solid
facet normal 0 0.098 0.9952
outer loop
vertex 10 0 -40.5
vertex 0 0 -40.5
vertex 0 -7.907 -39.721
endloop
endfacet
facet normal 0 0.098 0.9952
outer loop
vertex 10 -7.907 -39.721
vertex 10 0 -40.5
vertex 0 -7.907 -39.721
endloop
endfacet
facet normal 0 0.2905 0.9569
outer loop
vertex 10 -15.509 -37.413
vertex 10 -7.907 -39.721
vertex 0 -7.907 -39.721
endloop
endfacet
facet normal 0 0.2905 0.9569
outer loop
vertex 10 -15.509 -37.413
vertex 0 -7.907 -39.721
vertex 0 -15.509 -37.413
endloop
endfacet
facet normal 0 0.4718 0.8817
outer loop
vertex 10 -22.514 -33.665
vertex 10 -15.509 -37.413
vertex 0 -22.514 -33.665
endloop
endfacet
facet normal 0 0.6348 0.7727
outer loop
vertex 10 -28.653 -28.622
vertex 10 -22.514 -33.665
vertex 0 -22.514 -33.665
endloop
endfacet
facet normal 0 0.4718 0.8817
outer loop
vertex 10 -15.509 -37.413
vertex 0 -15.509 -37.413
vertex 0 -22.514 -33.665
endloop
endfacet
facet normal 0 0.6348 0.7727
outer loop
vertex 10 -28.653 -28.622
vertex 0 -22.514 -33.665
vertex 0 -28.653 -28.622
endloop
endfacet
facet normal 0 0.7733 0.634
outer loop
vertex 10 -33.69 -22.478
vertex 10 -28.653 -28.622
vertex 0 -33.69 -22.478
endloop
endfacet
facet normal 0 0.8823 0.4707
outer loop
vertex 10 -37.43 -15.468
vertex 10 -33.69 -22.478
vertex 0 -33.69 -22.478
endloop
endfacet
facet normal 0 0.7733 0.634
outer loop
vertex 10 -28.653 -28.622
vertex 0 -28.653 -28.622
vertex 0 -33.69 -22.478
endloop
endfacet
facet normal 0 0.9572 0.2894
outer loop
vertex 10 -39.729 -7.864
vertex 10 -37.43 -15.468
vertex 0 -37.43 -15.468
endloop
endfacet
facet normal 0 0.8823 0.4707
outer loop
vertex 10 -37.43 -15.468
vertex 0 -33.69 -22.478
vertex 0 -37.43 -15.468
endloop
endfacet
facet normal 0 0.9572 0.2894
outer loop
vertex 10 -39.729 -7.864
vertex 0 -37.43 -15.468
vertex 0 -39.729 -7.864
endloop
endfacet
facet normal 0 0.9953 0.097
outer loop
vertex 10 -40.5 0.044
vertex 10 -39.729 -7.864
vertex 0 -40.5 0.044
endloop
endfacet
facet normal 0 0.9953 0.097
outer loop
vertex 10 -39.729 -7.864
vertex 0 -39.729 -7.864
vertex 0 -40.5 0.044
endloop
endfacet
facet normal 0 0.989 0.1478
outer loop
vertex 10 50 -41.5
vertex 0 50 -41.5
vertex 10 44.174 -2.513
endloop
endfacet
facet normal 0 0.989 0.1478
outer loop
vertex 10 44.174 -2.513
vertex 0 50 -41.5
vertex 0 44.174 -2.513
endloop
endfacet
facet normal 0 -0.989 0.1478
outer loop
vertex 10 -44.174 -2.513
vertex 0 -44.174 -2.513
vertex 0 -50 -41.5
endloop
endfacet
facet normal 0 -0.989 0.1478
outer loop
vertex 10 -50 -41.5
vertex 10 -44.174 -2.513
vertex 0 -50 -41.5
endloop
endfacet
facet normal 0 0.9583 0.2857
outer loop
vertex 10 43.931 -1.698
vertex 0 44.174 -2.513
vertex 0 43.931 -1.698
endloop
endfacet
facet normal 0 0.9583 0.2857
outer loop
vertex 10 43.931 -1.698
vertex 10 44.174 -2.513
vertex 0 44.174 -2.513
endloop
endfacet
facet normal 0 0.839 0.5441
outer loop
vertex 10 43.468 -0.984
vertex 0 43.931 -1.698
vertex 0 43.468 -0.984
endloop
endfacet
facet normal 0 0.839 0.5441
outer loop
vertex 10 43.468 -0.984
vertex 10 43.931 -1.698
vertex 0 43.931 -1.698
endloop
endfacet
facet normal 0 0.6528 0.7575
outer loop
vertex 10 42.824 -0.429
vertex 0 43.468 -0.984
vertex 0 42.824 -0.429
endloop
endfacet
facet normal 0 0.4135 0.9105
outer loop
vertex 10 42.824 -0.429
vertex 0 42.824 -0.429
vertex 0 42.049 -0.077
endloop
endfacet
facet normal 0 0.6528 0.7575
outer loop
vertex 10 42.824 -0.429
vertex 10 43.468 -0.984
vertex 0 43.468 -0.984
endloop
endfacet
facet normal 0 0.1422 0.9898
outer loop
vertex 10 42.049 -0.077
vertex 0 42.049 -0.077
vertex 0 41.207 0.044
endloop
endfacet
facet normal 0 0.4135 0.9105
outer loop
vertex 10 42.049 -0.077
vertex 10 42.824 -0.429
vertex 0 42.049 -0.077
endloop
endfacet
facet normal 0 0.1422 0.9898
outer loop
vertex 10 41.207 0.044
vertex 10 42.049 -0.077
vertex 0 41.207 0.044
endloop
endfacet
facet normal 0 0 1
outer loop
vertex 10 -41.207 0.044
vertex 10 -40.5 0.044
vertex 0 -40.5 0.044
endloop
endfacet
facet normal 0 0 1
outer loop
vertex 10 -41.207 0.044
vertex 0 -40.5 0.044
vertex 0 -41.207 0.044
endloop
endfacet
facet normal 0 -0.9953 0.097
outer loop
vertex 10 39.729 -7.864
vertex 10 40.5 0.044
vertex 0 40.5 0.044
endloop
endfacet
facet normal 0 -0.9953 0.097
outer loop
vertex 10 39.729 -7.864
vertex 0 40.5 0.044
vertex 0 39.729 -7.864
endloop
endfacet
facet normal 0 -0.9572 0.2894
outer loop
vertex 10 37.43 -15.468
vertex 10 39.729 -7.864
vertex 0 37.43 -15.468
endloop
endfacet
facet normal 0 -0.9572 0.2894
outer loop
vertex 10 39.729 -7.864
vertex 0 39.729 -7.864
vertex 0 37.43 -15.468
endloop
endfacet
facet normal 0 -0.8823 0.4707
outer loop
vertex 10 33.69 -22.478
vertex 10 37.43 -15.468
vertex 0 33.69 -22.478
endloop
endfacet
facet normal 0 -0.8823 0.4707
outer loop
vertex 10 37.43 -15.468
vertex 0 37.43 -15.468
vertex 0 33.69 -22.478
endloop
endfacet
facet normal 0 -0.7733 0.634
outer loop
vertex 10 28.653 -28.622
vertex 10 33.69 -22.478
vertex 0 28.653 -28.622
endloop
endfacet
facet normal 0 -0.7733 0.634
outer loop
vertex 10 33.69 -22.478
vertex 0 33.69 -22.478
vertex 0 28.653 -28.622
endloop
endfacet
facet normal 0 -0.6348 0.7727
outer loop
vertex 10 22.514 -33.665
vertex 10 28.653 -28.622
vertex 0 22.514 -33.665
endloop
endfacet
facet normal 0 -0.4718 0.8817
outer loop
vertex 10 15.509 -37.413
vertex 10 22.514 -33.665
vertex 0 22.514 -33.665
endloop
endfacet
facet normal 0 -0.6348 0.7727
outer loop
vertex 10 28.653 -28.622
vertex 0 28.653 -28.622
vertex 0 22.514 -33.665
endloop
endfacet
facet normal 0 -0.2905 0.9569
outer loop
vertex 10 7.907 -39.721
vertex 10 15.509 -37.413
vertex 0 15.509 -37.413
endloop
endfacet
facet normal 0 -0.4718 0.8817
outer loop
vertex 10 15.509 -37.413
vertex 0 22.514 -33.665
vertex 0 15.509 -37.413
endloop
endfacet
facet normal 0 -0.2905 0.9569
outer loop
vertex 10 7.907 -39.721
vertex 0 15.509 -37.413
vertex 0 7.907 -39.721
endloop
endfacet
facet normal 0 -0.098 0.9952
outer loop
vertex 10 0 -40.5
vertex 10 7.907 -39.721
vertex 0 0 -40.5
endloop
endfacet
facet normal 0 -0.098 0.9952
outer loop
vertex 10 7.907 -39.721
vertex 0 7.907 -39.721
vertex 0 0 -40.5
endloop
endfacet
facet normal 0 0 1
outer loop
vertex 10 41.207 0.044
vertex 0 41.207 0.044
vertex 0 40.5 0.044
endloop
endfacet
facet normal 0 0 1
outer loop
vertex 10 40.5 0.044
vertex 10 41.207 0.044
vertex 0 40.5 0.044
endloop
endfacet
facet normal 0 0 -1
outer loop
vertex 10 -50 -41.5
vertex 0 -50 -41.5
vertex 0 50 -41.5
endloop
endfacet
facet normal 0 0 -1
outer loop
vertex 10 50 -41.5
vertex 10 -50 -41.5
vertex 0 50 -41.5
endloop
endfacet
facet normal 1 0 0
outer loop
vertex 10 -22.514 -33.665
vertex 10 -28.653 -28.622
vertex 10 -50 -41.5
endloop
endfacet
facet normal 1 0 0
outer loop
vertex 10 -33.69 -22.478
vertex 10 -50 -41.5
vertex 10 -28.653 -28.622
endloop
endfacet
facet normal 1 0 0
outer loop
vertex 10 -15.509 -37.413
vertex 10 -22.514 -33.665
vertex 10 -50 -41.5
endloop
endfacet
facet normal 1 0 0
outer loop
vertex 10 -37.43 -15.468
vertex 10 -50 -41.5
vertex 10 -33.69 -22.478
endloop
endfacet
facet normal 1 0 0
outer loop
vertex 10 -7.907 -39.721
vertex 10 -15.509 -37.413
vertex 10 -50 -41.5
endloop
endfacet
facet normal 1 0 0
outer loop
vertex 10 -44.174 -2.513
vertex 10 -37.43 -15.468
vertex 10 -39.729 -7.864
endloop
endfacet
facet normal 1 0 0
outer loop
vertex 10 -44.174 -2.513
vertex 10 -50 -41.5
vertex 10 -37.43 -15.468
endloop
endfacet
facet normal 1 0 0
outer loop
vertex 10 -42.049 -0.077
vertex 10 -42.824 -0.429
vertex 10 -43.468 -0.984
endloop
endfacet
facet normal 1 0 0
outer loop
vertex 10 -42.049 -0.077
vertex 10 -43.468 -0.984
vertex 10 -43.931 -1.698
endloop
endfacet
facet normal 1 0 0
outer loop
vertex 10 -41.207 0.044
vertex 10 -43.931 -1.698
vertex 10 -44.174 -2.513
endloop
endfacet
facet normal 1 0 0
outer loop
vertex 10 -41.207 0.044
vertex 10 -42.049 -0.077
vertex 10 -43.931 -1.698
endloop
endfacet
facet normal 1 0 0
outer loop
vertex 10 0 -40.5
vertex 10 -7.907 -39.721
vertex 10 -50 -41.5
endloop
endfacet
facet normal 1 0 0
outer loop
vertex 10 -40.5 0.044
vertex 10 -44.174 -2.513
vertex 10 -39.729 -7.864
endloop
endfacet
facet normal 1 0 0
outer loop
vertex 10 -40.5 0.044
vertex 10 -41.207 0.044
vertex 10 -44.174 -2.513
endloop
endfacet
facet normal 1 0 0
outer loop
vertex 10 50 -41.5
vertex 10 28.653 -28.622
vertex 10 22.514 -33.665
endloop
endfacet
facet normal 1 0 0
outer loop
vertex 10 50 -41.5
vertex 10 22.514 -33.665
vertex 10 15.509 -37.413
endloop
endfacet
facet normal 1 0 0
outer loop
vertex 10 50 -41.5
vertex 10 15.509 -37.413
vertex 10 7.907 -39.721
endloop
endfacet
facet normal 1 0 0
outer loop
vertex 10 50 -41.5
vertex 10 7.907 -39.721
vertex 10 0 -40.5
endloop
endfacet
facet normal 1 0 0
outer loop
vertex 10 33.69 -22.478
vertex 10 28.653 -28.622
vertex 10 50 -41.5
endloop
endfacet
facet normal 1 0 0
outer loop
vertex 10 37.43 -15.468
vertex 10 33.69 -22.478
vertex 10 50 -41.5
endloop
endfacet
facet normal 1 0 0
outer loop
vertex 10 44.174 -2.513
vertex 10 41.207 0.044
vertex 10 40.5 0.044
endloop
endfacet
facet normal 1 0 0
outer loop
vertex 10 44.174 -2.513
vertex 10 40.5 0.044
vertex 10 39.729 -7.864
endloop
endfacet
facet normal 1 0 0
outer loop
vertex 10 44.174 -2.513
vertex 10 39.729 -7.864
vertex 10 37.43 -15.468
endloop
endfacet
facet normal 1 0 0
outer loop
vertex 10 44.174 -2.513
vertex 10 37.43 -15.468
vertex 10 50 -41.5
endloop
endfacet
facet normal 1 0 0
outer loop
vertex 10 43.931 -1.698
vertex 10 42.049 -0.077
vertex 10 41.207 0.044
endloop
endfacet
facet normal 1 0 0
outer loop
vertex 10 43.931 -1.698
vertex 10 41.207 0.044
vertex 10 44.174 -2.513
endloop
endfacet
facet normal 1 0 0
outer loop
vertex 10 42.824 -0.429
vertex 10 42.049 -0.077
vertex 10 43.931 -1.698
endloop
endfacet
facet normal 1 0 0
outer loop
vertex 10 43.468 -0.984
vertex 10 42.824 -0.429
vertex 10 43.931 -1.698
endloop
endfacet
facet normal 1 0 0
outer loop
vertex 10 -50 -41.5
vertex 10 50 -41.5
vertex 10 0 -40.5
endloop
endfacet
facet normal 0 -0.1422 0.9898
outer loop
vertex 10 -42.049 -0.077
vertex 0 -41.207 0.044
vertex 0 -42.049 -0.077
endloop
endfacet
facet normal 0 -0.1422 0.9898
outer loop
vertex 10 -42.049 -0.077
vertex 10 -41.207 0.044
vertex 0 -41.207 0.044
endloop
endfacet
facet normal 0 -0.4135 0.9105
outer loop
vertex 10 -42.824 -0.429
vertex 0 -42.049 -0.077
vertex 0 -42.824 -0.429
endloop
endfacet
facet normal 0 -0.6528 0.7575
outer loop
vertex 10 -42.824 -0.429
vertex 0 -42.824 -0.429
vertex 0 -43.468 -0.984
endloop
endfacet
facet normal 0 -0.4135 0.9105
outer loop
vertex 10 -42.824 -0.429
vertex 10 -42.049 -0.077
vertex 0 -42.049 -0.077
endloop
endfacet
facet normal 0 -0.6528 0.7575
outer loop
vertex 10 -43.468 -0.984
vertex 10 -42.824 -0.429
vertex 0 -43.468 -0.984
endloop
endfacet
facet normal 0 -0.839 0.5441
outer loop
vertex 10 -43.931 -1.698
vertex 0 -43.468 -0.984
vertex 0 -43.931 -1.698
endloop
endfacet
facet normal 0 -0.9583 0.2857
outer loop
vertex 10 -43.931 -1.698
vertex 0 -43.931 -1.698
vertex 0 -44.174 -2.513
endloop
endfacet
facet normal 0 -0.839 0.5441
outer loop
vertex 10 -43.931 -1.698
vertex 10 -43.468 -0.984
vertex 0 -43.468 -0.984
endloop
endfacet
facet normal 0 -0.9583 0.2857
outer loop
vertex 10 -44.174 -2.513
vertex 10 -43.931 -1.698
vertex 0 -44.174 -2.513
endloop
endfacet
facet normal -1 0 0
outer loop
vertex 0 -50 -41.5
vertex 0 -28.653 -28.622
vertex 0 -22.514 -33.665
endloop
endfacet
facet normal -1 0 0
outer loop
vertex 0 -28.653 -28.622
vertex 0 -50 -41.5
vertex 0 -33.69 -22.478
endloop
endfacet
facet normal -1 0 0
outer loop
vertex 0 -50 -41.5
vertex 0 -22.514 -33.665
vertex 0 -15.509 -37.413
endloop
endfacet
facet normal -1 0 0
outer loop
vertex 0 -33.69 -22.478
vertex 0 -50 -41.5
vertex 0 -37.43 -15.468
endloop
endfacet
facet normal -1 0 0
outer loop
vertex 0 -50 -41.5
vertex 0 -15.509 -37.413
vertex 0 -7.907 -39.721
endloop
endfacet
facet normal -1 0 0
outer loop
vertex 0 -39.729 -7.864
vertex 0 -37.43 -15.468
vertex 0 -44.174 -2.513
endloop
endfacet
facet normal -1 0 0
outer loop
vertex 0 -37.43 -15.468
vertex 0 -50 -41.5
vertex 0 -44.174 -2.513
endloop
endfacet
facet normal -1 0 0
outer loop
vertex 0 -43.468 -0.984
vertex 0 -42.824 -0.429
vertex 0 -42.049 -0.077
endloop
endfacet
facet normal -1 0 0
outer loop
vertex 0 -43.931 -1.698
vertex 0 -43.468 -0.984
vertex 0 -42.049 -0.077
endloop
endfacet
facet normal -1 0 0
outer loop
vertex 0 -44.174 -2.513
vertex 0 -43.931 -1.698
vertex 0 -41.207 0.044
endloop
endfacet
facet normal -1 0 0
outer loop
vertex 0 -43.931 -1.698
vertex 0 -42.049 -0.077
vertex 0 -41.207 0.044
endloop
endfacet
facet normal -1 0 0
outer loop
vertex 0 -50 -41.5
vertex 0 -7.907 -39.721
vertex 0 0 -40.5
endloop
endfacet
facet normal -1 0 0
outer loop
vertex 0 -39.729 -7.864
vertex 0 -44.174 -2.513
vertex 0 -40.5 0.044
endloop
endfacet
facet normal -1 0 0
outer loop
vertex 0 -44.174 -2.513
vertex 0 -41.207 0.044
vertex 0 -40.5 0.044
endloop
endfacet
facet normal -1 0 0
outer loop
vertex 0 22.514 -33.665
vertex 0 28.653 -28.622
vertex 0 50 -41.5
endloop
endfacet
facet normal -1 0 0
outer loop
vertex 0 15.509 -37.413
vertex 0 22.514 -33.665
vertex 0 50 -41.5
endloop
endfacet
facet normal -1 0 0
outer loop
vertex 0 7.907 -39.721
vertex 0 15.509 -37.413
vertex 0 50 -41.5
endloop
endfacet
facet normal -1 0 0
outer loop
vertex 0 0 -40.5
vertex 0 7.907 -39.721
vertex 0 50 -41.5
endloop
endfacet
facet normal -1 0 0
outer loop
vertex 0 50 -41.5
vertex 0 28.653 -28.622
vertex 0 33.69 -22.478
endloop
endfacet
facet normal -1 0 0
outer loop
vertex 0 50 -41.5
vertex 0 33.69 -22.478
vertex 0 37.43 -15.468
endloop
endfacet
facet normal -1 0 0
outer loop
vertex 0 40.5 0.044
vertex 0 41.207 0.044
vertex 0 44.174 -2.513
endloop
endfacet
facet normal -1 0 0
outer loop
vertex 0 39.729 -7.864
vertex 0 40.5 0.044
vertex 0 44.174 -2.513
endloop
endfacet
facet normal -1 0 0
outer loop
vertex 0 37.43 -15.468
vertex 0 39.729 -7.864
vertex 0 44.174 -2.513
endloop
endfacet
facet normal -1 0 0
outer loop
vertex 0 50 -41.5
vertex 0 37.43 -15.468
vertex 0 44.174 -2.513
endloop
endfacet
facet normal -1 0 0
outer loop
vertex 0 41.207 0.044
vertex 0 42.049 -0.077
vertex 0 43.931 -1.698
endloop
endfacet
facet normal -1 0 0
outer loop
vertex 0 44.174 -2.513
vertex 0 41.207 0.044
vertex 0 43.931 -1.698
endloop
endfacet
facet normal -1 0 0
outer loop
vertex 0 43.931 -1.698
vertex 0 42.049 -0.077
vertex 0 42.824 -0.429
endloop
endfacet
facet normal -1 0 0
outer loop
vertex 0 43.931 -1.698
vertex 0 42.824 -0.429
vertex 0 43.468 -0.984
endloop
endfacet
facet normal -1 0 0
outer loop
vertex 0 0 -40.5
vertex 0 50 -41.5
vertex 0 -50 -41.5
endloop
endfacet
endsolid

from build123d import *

# Parameters (mm, degrees)
F1_DEPTH = 10
F2_R     = 3


with BuildPart() as f1:
    # F0 (on Right) → F1 (new body)
    with BuildSketch(Plane.YZ):
        with BuildLine():
            ThreePointArc((0, -40.5), (-28.653264, -28.622377), (-40.499976, 0.043681))
            Line((-40.499976, 0.043681), (-43.792324, 0.043681))
            Line((-43.792324, 0.043681), (-50, -41.5))
            Line((-50, -41.5), (0, -41.5))
            Line((0, -41.5), (0, -40.5))
        make_face()
        with BuildLine():
            ThreePointArc((40.499976, 0.043681), (28.653264, -28.622377), (0, -40.5))
            Line((0, -40.5), (0, -41.5))
            Line((0, -41.5), (50, -41.5))
            Line((50, -41.5), (43.792324, 0.043681))
            Line((43.792324, 0.043681), (40.499976, 0.043681))
        make_face()
    extrude(amount=F1_DEPTH)

    # F2
    f2_edges = [f1.edges().sort_by_distance(p)[0] for p in [
        (5, -43.792324, 0.043681),
        (5, 43.792324, 0.043681),
    ]]
    fillet(f2_edges, radius=F2_R)


solid = f1.part
